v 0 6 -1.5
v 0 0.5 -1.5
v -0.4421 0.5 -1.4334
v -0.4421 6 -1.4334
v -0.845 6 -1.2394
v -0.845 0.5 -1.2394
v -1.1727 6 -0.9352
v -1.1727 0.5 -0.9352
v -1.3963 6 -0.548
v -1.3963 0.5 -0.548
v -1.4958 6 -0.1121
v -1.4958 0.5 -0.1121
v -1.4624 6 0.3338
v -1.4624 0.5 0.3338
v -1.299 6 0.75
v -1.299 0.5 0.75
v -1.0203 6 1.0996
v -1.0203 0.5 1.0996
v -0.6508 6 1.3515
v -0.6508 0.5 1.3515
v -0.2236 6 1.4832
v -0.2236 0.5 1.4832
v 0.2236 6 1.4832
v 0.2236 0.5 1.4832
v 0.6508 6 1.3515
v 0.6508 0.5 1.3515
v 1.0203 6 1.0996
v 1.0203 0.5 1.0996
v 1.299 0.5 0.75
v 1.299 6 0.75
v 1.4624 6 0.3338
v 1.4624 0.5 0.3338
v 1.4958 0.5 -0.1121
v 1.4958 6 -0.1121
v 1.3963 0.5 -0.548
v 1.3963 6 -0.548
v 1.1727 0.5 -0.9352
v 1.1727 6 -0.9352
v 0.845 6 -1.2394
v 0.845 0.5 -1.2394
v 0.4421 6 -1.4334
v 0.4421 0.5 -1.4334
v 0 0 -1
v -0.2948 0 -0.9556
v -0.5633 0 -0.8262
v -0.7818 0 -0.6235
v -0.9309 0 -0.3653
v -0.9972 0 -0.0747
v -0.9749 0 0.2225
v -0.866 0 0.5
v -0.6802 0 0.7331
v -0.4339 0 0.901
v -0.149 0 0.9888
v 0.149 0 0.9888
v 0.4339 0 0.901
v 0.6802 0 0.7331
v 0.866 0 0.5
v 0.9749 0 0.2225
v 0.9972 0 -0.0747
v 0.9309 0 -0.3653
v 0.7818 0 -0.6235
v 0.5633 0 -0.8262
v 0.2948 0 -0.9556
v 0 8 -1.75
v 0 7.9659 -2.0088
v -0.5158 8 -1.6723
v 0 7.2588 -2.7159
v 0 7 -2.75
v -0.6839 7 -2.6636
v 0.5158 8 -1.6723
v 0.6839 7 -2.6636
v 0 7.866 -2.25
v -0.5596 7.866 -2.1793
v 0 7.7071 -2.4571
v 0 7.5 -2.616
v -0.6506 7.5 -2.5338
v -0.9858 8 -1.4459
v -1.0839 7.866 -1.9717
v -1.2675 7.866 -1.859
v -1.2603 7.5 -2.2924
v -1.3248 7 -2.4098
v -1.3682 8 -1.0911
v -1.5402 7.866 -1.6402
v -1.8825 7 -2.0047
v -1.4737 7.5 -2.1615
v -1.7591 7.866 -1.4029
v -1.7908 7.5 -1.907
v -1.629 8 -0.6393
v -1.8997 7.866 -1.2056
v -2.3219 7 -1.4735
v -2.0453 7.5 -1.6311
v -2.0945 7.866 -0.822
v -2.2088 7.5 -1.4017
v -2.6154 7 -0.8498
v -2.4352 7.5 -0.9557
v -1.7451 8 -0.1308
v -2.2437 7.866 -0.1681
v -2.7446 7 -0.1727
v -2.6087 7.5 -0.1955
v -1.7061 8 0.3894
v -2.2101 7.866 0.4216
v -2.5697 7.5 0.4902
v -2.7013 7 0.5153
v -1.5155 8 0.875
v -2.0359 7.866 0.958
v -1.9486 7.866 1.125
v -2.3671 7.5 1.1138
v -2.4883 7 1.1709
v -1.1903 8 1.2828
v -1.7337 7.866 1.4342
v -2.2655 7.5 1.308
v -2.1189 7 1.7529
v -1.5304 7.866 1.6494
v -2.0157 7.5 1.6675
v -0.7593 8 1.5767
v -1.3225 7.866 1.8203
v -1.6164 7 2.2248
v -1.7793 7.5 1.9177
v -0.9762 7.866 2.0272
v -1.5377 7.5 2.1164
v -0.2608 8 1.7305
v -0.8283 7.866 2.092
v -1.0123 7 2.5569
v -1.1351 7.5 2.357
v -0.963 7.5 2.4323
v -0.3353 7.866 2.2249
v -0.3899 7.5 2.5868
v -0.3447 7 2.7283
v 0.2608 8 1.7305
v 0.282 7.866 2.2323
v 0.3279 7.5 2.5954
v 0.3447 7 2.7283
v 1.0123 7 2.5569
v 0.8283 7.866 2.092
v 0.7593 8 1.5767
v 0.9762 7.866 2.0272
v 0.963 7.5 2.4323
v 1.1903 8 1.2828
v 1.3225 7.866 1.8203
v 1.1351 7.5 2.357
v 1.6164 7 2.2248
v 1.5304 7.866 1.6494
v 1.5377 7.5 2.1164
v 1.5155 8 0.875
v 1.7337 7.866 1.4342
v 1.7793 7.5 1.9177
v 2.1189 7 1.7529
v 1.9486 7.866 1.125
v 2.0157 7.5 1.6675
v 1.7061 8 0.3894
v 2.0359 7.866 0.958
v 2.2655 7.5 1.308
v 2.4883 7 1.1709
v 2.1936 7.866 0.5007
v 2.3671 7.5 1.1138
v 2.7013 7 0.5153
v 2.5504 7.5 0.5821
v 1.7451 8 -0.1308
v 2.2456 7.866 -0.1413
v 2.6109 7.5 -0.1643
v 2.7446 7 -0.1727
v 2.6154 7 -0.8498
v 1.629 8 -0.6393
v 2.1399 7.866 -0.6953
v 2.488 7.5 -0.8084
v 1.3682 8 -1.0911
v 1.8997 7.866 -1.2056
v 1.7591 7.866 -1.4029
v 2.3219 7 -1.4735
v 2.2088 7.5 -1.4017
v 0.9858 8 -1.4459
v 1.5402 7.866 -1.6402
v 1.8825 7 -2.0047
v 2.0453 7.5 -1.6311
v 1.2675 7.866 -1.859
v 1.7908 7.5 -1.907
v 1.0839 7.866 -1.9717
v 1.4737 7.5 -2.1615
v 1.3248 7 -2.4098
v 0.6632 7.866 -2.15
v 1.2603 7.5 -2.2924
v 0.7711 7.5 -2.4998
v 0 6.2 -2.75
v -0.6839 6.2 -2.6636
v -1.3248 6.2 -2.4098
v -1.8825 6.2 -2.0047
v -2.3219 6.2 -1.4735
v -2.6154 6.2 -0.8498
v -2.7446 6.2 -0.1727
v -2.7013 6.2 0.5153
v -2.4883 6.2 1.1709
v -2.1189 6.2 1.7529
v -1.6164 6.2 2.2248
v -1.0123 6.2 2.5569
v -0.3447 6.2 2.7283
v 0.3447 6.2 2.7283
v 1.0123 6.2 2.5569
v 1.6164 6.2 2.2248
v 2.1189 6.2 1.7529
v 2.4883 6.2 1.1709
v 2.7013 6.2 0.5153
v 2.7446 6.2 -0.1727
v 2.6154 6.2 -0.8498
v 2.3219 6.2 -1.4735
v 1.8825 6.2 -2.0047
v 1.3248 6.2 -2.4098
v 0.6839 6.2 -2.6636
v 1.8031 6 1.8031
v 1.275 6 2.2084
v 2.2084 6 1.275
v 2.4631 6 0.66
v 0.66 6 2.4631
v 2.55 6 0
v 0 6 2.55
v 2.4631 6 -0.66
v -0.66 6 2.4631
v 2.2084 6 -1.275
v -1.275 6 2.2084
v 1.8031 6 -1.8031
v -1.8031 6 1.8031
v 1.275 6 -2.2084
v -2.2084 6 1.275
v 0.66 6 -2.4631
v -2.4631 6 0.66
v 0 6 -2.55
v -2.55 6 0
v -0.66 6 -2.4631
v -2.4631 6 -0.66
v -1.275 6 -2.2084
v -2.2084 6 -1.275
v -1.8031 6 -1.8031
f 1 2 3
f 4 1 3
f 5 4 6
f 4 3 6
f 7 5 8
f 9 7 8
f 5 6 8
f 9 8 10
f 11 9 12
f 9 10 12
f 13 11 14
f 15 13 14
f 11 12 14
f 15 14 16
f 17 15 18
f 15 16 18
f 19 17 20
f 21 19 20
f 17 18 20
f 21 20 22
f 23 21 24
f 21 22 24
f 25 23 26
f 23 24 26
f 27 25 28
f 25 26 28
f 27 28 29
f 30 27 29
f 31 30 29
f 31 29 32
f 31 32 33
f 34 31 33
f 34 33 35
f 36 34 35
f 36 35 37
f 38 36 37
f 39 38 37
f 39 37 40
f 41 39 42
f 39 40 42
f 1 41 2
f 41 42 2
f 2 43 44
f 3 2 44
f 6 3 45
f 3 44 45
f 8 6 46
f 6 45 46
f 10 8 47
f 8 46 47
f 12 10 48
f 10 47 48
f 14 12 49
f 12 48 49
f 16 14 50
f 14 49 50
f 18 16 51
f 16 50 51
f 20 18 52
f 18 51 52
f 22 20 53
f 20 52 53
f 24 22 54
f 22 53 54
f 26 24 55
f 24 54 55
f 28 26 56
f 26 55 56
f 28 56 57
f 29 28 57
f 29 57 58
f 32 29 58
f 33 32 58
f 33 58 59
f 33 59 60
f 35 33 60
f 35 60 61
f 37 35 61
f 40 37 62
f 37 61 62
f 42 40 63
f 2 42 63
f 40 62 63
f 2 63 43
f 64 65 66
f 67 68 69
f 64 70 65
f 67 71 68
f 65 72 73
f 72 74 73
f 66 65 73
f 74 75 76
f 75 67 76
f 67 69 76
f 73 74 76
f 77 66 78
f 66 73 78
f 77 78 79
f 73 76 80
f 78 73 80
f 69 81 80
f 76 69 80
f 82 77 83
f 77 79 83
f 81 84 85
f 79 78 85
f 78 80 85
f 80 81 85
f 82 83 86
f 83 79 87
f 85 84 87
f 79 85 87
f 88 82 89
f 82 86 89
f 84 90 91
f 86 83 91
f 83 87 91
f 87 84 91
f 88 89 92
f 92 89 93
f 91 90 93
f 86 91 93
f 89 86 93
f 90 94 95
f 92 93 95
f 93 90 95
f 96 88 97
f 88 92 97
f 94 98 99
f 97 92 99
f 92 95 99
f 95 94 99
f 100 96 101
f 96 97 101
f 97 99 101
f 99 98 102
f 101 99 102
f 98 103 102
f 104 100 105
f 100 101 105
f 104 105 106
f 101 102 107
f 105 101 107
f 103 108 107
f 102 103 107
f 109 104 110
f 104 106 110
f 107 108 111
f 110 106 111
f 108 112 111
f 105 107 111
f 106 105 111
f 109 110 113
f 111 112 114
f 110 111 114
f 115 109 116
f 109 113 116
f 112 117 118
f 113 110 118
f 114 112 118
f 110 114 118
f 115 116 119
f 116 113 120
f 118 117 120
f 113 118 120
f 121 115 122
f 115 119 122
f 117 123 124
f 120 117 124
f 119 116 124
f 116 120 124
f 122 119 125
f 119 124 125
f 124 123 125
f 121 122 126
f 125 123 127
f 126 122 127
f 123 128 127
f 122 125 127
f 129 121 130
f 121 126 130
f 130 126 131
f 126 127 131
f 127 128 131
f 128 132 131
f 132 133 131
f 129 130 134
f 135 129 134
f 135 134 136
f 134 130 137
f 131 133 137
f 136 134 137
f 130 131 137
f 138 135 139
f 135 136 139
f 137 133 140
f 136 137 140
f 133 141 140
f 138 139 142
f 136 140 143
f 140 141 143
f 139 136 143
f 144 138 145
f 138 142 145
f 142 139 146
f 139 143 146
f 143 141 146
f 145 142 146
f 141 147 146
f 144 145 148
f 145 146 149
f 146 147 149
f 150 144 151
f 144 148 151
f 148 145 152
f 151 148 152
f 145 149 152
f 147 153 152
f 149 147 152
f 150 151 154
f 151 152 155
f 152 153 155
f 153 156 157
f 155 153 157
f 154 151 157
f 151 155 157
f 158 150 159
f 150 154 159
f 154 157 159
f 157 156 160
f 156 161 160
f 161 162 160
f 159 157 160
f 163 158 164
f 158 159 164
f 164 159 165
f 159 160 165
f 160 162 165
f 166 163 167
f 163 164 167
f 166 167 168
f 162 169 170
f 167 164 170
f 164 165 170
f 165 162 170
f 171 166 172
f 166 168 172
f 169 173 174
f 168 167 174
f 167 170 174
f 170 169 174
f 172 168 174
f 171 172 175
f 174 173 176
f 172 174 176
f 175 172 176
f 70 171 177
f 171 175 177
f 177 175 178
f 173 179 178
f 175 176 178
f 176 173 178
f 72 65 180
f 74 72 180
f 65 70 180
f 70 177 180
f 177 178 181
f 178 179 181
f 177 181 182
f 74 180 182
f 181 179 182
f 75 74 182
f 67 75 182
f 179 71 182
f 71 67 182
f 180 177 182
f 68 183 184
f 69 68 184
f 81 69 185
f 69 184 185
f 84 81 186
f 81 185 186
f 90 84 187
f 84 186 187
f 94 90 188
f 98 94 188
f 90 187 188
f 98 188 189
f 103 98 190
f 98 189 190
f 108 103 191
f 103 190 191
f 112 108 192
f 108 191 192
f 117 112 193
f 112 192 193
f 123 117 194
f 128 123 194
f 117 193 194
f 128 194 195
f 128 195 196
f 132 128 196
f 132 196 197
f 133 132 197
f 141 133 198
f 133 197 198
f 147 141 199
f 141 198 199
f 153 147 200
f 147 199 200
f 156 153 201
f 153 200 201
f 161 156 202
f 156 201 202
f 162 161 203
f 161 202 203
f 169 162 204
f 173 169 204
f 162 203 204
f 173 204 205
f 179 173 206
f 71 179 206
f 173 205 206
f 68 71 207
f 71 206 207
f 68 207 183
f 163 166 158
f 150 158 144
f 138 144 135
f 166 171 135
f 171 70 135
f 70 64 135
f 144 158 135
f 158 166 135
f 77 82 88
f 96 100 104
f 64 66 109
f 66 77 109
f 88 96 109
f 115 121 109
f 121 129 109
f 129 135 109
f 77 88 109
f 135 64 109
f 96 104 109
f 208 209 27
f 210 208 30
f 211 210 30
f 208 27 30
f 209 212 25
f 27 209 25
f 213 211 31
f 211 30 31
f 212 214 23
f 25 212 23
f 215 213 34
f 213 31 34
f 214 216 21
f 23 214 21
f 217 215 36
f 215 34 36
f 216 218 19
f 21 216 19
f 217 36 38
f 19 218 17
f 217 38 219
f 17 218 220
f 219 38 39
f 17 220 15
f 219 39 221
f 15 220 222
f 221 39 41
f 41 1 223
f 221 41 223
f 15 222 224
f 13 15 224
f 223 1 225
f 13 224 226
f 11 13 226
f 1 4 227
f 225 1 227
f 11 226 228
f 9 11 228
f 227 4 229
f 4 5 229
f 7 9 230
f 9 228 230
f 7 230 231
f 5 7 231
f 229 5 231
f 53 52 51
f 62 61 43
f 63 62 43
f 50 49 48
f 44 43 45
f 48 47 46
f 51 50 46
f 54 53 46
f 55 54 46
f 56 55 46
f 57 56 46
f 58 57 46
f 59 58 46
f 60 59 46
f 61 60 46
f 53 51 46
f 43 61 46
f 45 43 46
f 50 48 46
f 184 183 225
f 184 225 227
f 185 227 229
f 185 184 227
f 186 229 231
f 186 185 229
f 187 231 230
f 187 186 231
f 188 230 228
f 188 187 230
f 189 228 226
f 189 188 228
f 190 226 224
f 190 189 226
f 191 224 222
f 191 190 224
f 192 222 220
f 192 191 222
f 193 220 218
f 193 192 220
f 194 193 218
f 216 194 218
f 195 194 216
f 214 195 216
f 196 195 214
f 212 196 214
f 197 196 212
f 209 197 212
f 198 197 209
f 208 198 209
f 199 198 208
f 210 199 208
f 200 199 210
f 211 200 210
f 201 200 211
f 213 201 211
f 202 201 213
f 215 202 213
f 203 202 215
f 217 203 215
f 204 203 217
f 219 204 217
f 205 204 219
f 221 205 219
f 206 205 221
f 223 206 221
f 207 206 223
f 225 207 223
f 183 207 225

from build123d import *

# Parameters (mm, degrees)
FILLET1_R     = 1
CHAMFER1_SIZE = 0.5
CHAMFER2_SIZE = 0.2


with BuildPart() as part:
    # Sketch1 → Revolve1 (revolve)
    with BuildSketch(Plane.XY, mode=Mode.PRIVATE) as revolve1_sk:
        Polygon((0, 0), (0, 8), (2.75, 8), (2.75, 6), (1.5, 6), (1.5, 0), align=None)
    revolve(revolve1_sk.sketch.rotate(Axis((0, 0, 0), (0, 1, 0)), 90), axis=Axis((0, 0, 0), (0, 1, 0)))

    # Fillet1
    fillet1_edges = [part.edges().sort_by_distance(p)[0] for p in [
        (0, 8, 2.75),
    ]]
    fillet(fillet1_edges, radius=FILLET1_R)

    # Chamfer1
    chamfer1_edges = [part.edges().sort_by_distance(p)[0] for p in [
        (0, 0, 1.5),
    ]]
    chamfer(chamfer1_edges, length=CHAMFER1_SIZE)

    # Chamfer2
    chamfer2_edges = [part.edges().sort_by_distance(p)[0] for p in [
        (0, 6, 2.75),
    ]]
    chamfer(chamfer2_edges, length=CHAMFER2_SIZE)


solid = part.part
